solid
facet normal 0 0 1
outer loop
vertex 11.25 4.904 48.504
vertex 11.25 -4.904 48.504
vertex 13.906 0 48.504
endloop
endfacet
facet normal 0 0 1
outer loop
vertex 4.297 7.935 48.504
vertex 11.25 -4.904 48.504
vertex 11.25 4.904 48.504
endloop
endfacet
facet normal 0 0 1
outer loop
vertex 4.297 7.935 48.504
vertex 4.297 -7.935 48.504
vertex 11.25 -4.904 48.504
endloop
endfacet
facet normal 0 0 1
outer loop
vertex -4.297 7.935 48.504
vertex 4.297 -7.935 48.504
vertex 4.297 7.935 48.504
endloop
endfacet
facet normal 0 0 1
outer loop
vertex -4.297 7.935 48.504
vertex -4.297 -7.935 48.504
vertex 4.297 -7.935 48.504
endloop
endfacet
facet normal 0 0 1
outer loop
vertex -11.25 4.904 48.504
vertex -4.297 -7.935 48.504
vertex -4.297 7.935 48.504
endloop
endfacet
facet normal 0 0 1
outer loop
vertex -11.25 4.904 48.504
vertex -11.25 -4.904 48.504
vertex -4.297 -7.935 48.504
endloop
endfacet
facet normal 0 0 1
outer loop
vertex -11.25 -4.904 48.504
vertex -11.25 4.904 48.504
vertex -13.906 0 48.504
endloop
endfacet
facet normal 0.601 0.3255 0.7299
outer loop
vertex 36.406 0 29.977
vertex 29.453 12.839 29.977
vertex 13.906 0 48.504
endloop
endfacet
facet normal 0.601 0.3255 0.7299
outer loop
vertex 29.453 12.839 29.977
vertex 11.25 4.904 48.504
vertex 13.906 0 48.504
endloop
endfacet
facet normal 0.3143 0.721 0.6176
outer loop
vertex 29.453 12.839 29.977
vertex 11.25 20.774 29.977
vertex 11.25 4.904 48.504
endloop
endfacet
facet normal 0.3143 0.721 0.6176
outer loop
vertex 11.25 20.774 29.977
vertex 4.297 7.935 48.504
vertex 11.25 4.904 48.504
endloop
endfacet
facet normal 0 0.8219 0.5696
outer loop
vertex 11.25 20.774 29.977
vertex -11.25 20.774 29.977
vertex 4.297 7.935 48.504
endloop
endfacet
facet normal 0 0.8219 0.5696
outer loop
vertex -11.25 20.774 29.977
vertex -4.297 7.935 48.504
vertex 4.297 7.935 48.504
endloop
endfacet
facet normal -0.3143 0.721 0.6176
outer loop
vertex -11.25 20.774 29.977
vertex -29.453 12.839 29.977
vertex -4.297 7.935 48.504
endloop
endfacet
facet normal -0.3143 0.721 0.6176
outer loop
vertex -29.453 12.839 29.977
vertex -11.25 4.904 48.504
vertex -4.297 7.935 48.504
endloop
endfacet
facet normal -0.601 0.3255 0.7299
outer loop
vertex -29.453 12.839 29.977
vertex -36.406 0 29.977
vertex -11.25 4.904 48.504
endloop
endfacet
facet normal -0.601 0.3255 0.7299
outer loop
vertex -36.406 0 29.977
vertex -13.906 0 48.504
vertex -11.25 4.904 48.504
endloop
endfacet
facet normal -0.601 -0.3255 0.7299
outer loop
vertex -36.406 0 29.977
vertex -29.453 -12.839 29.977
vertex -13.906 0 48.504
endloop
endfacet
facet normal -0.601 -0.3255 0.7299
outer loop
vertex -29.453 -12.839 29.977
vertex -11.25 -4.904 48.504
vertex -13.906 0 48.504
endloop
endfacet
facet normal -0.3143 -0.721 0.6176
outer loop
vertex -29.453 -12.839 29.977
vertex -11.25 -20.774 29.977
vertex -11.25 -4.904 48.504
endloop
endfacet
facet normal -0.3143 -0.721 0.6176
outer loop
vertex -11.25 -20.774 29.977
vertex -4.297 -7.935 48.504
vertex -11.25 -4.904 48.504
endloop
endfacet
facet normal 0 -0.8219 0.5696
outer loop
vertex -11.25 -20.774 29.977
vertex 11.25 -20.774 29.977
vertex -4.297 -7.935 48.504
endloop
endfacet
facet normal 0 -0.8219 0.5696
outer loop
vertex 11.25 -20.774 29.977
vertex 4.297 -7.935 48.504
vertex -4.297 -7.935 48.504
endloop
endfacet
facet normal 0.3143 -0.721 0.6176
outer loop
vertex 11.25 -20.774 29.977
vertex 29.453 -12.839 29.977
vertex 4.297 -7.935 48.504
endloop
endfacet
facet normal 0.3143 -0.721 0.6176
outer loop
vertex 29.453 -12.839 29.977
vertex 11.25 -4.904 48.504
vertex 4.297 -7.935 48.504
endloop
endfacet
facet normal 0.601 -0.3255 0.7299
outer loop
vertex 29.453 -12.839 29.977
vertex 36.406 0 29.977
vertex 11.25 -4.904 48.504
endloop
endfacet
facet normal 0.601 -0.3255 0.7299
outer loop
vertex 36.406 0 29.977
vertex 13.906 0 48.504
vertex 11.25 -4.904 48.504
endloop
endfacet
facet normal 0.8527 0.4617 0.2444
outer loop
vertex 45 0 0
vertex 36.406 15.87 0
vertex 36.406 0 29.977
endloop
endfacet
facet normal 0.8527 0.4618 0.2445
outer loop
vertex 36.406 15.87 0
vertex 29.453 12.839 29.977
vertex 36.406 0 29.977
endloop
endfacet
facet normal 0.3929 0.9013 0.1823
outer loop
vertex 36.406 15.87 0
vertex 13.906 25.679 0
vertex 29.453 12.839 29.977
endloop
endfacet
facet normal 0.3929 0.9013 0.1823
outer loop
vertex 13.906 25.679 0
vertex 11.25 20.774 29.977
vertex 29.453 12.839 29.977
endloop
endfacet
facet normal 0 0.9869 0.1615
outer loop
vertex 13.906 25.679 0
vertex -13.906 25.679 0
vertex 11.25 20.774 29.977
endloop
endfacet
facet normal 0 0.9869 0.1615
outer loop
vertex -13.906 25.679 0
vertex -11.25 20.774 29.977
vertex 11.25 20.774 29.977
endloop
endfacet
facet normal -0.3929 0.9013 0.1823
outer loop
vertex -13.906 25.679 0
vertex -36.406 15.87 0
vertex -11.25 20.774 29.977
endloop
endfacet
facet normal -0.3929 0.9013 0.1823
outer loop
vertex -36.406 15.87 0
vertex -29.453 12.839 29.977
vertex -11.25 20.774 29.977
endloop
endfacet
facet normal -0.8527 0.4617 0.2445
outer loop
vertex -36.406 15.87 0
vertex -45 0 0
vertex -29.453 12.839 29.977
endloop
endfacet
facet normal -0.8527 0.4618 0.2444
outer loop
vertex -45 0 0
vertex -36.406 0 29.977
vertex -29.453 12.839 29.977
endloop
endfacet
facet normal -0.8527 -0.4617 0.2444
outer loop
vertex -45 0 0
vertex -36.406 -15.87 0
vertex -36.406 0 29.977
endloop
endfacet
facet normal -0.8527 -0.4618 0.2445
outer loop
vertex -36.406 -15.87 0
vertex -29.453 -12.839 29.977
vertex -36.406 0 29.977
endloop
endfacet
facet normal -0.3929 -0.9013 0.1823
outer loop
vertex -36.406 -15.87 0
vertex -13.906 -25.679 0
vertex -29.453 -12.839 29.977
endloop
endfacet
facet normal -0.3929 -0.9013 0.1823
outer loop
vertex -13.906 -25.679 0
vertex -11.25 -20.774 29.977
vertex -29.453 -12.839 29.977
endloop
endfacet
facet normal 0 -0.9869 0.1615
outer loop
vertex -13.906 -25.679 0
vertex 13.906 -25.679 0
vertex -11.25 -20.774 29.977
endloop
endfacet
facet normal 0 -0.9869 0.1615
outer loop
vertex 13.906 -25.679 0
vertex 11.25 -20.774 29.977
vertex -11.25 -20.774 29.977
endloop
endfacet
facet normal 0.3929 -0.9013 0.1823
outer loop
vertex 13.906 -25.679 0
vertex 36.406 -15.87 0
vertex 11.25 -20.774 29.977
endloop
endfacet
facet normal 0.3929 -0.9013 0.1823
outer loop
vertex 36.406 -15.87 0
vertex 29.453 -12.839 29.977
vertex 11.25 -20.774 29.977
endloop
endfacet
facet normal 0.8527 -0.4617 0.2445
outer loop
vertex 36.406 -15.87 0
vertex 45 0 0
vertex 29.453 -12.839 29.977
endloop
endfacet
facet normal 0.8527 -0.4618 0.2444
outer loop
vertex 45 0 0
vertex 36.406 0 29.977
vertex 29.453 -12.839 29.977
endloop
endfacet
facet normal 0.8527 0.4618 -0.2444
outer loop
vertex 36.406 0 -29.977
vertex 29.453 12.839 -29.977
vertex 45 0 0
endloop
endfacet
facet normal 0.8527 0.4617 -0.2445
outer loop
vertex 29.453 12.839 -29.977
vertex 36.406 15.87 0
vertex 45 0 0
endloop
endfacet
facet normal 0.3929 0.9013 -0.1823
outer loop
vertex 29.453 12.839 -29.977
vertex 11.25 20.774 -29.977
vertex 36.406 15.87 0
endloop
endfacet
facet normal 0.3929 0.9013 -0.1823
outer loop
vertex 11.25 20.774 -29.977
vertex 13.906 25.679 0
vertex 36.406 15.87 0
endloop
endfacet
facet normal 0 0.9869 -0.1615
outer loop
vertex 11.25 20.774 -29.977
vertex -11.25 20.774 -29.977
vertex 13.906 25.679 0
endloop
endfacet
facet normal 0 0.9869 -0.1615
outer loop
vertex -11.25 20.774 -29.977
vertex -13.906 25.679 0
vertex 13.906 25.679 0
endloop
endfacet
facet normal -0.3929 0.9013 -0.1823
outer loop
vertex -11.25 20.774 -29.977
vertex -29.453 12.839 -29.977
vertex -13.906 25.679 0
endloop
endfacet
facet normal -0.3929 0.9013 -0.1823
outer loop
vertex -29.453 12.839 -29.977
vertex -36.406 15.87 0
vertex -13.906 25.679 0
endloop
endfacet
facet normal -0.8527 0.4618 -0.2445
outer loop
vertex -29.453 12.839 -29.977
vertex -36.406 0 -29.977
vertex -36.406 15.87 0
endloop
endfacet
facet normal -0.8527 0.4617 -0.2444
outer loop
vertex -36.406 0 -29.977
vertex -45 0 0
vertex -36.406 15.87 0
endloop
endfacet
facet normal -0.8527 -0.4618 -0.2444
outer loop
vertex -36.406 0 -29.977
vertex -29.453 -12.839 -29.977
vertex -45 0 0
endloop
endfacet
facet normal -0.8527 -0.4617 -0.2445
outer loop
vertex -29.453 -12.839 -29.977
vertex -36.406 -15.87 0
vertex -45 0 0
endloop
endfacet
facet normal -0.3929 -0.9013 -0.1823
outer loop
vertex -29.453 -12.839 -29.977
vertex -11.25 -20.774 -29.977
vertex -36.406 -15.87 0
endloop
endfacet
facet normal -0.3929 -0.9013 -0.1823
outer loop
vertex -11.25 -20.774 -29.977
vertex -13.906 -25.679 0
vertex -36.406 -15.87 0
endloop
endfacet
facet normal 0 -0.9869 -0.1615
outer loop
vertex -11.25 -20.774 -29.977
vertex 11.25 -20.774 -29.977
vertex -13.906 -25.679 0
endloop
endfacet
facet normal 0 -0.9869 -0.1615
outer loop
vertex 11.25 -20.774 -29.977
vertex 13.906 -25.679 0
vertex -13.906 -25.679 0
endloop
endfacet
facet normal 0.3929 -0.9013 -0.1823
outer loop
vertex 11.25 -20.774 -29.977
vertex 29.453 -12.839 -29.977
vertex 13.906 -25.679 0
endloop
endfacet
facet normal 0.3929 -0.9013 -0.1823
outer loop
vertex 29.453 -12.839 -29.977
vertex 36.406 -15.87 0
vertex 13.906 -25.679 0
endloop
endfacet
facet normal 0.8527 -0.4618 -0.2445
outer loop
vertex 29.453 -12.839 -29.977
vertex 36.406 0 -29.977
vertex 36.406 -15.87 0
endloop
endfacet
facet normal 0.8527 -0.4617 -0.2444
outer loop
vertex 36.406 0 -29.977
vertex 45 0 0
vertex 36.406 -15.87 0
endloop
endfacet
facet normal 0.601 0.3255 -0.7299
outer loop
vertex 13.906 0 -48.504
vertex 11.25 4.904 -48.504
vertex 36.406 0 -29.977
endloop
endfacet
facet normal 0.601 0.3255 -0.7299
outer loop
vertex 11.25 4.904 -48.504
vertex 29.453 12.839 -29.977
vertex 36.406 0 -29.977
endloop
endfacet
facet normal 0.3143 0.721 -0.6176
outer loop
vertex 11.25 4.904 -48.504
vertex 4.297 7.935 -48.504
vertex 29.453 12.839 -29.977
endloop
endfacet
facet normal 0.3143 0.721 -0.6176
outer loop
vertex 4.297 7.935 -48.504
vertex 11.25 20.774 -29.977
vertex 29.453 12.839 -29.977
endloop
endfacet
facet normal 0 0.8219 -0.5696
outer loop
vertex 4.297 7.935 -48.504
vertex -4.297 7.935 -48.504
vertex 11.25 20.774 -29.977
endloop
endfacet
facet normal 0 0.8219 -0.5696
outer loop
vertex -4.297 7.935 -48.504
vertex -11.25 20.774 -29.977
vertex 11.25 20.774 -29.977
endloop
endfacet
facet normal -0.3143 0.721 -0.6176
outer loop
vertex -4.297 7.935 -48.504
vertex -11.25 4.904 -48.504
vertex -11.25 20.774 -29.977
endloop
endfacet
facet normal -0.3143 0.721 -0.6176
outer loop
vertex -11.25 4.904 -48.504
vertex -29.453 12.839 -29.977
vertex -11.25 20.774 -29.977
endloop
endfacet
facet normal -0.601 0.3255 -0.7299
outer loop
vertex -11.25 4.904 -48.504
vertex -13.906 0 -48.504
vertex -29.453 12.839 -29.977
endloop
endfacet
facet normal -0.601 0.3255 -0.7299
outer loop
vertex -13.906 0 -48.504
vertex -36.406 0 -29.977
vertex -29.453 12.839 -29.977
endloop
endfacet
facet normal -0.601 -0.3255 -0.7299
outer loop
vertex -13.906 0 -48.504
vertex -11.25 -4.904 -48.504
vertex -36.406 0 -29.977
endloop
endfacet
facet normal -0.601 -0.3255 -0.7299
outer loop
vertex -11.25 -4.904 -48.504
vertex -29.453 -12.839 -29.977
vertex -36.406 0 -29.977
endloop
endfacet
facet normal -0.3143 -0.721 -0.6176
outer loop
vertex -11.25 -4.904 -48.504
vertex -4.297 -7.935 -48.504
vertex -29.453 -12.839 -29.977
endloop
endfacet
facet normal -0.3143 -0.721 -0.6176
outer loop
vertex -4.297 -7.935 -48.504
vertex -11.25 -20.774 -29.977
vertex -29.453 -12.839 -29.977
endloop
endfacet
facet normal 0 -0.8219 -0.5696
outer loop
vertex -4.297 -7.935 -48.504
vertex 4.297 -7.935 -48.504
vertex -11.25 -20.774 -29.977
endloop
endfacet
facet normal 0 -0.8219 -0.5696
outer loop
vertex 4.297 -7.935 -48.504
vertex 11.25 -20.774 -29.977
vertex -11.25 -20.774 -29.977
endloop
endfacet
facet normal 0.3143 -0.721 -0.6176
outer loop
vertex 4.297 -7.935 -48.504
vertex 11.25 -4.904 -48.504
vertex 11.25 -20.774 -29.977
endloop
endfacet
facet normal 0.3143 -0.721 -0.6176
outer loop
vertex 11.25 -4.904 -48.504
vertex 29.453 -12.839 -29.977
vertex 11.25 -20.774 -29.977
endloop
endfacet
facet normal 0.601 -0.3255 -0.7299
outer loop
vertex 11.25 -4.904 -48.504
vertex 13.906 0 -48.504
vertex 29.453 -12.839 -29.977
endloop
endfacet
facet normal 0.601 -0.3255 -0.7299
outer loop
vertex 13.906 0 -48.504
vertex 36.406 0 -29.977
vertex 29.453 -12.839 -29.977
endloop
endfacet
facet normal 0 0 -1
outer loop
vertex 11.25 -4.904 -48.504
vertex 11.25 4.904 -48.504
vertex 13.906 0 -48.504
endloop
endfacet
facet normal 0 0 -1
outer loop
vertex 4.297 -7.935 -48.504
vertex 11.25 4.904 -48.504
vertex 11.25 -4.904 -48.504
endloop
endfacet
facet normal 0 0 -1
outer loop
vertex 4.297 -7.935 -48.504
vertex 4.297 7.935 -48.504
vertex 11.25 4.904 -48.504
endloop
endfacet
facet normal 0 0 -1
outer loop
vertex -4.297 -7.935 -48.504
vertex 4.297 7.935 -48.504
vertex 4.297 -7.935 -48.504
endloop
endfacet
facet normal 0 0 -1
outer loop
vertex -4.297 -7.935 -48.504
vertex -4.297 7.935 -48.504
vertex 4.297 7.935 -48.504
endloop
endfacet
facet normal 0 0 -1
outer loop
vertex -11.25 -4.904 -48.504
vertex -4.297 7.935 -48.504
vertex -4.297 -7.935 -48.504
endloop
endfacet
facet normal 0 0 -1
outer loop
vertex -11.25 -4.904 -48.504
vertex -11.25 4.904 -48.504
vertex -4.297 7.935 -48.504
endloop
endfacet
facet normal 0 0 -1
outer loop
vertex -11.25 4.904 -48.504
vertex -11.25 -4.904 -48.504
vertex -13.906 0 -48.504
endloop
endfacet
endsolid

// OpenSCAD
// Generated by SolidPython 1.0.1 on 2020-07-29 00:46:52


scale(v = [15, 9, 17]) {
	sphere(r = 3);
}
/***********************************************
*********      SolidPython code:      **********
************************************************
 
# import packages: SolidPython
from solid import *
from solid.utils import *
from itertools import chain, combinations, permutations


class Resize:

    def __init__(self, scad_file):
        self.scad_file = scad_file
        #self.scad_file = import_scad(scad_file)
        # cone/cylinder param:
        self.r1 = 0
        self.r2 = 0
        self.h = 0
        # rectangular prism param:
        self.w = 0
        self.l = 0
        # ellipse param:
        self.r = 0

    # import OpenScad code (file name corresponds to shape)


    # classify shape + parameters
    def assign(self, param1, param2, param3):
        if self.scad_file == 'cone.scad':
            self.r1 = param1
            self.r2 = param2
            self.h = param3
        elif self.scad_file == 'cylinder.scad':
            self.r1 = param1
            self.r2 = param2
            self.h = param3
        elif self.scad_file == 'rectangularPrism.scad':
            self.h = param1
            self.l = param2
            self.w = param3
        else:
            self.r = param1
            self.h = param2

    # resize parameters
    def iterate(self):
        x = range(3, 20, 2)
        i = 1
        if self.scad_file == 'cone.scad':
            tempList = list(permutations(x, 2))
            for temp in tempList:
                param1 = temp[0]
                param2 = temp[1]
                filepath = 'produced_scad_files/' + 'cone' + str(param1) + '_' + str(param2) + '_' + '.scad'
                scad_render_to_file(cylinder(h=param1, r1=param2, r2=0), filepath)

        elif self.scad_file == 'cylinder.scad':
            tempList = list(permutations(x, 3))
            for temp in tempList:
                param1 = temp[0]
                param2 = temp[1]
                filepath = 'produced_scad_files/' + 'cylinder' + str(param1) + '_' + str(param2) + '_' + '.scad'
                scad_render_to_file(cylinder(h=param1, r1=param2, r2=param2), filepath)

        elif self.scad_file == 'rectangularPrism.scad':
            tempList = list(permutations(x, 3))
            for temp in tempList:
                param1 = temp[0]
                param2 = temp[1]
                param3 = temp[2]
                filepath = 'produced_scad_files/' + 'rectangularPrism' + str(param1) + '_' + str(param2) + '_' + str(
                    param3) + '.scad'
                scad_render_to_file(cube(size=(param1, param2, param3)), filepath)

        elif self.scad_file == 'ellipse.scad':
            tempList = list(permutations(x, 4))
            for temp in tempList:
                param1 = temp[0]
                param2 = temp[1]
                param3 = temp[2]
                param4 = temp[3]
                filepath = 'produced_scad_files/' + 'ellipse' + str(param1) + '_' + str(param2) + '_' + str(param3) + '_' + str(param4) + '.scad'
                scad_render_to_file(scale([param1, param2, param3])(sphere(r=param4)), filepath)

    def render_to_scadfile(self):
        scad_render_to_file(scad, 'example.scad') 
 
************************************************/
